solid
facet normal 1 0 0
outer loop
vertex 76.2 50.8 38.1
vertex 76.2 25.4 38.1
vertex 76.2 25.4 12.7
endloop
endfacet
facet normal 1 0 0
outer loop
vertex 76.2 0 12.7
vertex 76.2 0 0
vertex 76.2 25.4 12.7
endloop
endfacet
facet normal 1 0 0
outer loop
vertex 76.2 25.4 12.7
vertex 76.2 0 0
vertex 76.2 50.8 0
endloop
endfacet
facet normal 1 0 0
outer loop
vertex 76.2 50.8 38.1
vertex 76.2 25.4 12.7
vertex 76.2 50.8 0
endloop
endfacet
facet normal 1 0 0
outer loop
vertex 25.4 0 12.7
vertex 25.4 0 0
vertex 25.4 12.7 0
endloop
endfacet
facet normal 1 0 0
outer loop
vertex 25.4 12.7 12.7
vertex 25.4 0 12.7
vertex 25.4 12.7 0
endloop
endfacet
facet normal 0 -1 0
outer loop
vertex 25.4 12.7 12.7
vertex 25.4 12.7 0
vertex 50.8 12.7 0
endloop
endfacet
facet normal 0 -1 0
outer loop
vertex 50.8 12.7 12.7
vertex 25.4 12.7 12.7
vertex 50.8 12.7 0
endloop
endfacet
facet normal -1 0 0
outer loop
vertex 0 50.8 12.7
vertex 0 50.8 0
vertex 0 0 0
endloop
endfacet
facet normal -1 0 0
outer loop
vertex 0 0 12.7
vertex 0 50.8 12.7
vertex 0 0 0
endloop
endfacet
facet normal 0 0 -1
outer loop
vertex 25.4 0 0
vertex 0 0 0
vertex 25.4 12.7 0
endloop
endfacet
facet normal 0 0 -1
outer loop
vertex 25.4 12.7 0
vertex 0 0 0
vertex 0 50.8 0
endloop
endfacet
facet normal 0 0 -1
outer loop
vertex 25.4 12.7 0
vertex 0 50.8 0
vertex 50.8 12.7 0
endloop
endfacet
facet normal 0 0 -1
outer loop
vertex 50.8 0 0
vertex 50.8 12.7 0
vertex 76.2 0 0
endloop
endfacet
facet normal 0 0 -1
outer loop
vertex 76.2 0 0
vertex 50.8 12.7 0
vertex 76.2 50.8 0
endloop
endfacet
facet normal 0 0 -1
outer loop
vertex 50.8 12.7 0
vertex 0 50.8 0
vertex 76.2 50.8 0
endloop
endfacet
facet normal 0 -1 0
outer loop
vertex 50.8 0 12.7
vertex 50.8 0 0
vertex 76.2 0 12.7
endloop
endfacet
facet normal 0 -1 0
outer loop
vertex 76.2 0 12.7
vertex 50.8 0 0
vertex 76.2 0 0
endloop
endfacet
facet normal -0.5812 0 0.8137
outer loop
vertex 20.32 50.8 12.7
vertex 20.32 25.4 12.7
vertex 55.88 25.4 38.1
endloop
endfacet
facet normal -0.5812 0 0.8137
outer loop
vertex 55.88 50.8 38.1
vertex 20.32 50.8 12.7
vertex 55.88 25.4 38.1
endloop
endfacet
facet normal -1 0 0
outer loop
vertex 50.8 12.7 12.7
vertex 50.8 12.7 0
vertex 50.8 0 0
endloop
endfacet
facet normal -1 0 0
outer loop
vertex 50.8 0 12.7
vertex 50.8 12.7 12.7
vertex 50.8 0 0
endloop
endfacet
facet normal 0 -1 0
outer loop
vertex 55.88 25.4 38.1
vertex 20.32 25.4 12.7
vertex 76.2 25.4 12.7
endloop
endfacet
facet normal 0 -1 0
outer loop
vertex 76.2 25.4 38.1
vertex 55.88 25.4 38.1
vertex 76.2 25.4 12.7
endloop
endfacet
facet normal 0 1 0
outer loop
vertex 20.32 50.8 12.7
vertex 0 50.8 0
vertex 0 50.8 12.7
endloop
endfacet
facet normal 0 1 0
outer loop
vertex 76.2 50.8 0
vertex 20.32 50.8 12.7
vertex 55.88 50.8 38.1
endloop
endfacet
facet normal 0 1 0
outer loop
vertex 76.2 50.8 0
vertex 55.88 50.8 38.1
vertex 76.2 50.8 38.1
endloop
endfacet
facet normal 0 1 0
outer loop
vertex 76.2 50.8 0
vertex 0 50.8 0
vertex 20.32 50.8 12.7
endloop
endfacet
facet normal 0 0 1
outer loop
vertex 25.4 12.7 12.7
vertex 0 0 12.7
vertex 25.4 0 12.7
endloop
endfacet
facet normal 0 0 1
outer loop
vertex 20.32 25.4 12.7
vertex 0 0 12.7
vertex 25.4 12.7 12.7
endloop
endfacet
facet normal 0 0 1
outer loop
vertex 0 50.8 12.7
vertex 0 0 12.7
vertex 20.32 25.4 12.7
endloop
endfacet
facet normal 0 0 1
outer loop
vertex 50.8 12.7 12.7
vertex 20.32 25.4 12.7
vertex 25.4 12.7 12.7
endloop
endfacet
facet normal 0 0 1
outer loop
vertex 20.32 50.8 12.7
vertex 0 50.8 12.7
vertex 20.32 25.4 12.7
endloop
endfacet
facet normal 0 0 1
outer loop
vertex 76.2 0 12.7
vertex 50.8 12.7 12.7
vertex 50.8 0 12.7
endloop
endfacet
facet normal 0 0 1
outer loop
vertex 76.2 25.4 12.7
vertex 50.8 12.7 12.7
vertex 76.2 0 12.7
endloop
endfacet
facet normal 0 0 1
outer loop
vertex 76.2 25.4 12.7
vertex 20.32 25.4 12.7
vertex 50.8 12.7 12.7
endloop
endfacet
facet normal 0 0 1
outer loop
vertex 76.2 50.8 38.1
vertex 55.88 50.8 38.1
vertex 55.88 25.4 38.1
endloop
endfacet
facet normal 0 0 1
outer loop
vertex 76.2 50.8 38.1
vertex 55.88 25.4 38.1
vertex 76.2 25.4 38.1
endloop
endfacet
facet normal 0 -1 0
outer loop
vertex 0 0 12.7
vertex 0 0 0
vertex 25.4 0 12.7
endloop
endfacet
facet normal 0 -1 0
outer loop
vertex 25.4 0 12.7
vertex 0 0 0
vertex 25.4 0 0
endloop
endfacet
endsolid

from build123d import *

# Parameters (mm, degrees)
F1_DEPTH = 12.7
F0_W     = 20.32
F0_H     = 25.4
F2_DEPTH = 38.1
F0_W_2   = 35.56
F3_DEPTH = 38.1
F5_DEPTH = 25.4


with BuildPart() as f1:
    # F0 (on Top) → F1 (new body)
    with BuildSketch(Plane.XY):
        Polygon((0, 50.8), (0, 0), (25.4, 0), (25.4, 12.7), (50.8, 12.7), (50.8, 0), (76.2, 0), (76.2, 25.4), (55.88, 25.4), (20.32, 25.4), (20.32, 50.8), align=None)
    extrude(amount=F1_DEPTH)

    # F0 (on Top) → F2 (join)
    with BuildSketch(Plane.XY):
        with Locations((66.04, 38.1)):
            Rectangle(F0_W, F0_H)
    extrude(amount=F2_DEPTH)

    # F0 (on Top) → F3 (join)
    with BuildSketch(Plane.XY):
        with Locations((38.1, 38.1)):
            Rectangle(F0_W_2, F0_H)
    extrude(amount=F3_DEPTH)

    # F4 (on face) → F5 (cut)
    with BuildSketch(Plane.XZ.offset(-25.4)):
        Polygon((20.32, 38.1), (20.32, 12.7), (55.88, 38.1), align=None)
    extrude(amount=-F5_DEPTH, mode=Mode.SUBTRACT)


solid = f1.part
